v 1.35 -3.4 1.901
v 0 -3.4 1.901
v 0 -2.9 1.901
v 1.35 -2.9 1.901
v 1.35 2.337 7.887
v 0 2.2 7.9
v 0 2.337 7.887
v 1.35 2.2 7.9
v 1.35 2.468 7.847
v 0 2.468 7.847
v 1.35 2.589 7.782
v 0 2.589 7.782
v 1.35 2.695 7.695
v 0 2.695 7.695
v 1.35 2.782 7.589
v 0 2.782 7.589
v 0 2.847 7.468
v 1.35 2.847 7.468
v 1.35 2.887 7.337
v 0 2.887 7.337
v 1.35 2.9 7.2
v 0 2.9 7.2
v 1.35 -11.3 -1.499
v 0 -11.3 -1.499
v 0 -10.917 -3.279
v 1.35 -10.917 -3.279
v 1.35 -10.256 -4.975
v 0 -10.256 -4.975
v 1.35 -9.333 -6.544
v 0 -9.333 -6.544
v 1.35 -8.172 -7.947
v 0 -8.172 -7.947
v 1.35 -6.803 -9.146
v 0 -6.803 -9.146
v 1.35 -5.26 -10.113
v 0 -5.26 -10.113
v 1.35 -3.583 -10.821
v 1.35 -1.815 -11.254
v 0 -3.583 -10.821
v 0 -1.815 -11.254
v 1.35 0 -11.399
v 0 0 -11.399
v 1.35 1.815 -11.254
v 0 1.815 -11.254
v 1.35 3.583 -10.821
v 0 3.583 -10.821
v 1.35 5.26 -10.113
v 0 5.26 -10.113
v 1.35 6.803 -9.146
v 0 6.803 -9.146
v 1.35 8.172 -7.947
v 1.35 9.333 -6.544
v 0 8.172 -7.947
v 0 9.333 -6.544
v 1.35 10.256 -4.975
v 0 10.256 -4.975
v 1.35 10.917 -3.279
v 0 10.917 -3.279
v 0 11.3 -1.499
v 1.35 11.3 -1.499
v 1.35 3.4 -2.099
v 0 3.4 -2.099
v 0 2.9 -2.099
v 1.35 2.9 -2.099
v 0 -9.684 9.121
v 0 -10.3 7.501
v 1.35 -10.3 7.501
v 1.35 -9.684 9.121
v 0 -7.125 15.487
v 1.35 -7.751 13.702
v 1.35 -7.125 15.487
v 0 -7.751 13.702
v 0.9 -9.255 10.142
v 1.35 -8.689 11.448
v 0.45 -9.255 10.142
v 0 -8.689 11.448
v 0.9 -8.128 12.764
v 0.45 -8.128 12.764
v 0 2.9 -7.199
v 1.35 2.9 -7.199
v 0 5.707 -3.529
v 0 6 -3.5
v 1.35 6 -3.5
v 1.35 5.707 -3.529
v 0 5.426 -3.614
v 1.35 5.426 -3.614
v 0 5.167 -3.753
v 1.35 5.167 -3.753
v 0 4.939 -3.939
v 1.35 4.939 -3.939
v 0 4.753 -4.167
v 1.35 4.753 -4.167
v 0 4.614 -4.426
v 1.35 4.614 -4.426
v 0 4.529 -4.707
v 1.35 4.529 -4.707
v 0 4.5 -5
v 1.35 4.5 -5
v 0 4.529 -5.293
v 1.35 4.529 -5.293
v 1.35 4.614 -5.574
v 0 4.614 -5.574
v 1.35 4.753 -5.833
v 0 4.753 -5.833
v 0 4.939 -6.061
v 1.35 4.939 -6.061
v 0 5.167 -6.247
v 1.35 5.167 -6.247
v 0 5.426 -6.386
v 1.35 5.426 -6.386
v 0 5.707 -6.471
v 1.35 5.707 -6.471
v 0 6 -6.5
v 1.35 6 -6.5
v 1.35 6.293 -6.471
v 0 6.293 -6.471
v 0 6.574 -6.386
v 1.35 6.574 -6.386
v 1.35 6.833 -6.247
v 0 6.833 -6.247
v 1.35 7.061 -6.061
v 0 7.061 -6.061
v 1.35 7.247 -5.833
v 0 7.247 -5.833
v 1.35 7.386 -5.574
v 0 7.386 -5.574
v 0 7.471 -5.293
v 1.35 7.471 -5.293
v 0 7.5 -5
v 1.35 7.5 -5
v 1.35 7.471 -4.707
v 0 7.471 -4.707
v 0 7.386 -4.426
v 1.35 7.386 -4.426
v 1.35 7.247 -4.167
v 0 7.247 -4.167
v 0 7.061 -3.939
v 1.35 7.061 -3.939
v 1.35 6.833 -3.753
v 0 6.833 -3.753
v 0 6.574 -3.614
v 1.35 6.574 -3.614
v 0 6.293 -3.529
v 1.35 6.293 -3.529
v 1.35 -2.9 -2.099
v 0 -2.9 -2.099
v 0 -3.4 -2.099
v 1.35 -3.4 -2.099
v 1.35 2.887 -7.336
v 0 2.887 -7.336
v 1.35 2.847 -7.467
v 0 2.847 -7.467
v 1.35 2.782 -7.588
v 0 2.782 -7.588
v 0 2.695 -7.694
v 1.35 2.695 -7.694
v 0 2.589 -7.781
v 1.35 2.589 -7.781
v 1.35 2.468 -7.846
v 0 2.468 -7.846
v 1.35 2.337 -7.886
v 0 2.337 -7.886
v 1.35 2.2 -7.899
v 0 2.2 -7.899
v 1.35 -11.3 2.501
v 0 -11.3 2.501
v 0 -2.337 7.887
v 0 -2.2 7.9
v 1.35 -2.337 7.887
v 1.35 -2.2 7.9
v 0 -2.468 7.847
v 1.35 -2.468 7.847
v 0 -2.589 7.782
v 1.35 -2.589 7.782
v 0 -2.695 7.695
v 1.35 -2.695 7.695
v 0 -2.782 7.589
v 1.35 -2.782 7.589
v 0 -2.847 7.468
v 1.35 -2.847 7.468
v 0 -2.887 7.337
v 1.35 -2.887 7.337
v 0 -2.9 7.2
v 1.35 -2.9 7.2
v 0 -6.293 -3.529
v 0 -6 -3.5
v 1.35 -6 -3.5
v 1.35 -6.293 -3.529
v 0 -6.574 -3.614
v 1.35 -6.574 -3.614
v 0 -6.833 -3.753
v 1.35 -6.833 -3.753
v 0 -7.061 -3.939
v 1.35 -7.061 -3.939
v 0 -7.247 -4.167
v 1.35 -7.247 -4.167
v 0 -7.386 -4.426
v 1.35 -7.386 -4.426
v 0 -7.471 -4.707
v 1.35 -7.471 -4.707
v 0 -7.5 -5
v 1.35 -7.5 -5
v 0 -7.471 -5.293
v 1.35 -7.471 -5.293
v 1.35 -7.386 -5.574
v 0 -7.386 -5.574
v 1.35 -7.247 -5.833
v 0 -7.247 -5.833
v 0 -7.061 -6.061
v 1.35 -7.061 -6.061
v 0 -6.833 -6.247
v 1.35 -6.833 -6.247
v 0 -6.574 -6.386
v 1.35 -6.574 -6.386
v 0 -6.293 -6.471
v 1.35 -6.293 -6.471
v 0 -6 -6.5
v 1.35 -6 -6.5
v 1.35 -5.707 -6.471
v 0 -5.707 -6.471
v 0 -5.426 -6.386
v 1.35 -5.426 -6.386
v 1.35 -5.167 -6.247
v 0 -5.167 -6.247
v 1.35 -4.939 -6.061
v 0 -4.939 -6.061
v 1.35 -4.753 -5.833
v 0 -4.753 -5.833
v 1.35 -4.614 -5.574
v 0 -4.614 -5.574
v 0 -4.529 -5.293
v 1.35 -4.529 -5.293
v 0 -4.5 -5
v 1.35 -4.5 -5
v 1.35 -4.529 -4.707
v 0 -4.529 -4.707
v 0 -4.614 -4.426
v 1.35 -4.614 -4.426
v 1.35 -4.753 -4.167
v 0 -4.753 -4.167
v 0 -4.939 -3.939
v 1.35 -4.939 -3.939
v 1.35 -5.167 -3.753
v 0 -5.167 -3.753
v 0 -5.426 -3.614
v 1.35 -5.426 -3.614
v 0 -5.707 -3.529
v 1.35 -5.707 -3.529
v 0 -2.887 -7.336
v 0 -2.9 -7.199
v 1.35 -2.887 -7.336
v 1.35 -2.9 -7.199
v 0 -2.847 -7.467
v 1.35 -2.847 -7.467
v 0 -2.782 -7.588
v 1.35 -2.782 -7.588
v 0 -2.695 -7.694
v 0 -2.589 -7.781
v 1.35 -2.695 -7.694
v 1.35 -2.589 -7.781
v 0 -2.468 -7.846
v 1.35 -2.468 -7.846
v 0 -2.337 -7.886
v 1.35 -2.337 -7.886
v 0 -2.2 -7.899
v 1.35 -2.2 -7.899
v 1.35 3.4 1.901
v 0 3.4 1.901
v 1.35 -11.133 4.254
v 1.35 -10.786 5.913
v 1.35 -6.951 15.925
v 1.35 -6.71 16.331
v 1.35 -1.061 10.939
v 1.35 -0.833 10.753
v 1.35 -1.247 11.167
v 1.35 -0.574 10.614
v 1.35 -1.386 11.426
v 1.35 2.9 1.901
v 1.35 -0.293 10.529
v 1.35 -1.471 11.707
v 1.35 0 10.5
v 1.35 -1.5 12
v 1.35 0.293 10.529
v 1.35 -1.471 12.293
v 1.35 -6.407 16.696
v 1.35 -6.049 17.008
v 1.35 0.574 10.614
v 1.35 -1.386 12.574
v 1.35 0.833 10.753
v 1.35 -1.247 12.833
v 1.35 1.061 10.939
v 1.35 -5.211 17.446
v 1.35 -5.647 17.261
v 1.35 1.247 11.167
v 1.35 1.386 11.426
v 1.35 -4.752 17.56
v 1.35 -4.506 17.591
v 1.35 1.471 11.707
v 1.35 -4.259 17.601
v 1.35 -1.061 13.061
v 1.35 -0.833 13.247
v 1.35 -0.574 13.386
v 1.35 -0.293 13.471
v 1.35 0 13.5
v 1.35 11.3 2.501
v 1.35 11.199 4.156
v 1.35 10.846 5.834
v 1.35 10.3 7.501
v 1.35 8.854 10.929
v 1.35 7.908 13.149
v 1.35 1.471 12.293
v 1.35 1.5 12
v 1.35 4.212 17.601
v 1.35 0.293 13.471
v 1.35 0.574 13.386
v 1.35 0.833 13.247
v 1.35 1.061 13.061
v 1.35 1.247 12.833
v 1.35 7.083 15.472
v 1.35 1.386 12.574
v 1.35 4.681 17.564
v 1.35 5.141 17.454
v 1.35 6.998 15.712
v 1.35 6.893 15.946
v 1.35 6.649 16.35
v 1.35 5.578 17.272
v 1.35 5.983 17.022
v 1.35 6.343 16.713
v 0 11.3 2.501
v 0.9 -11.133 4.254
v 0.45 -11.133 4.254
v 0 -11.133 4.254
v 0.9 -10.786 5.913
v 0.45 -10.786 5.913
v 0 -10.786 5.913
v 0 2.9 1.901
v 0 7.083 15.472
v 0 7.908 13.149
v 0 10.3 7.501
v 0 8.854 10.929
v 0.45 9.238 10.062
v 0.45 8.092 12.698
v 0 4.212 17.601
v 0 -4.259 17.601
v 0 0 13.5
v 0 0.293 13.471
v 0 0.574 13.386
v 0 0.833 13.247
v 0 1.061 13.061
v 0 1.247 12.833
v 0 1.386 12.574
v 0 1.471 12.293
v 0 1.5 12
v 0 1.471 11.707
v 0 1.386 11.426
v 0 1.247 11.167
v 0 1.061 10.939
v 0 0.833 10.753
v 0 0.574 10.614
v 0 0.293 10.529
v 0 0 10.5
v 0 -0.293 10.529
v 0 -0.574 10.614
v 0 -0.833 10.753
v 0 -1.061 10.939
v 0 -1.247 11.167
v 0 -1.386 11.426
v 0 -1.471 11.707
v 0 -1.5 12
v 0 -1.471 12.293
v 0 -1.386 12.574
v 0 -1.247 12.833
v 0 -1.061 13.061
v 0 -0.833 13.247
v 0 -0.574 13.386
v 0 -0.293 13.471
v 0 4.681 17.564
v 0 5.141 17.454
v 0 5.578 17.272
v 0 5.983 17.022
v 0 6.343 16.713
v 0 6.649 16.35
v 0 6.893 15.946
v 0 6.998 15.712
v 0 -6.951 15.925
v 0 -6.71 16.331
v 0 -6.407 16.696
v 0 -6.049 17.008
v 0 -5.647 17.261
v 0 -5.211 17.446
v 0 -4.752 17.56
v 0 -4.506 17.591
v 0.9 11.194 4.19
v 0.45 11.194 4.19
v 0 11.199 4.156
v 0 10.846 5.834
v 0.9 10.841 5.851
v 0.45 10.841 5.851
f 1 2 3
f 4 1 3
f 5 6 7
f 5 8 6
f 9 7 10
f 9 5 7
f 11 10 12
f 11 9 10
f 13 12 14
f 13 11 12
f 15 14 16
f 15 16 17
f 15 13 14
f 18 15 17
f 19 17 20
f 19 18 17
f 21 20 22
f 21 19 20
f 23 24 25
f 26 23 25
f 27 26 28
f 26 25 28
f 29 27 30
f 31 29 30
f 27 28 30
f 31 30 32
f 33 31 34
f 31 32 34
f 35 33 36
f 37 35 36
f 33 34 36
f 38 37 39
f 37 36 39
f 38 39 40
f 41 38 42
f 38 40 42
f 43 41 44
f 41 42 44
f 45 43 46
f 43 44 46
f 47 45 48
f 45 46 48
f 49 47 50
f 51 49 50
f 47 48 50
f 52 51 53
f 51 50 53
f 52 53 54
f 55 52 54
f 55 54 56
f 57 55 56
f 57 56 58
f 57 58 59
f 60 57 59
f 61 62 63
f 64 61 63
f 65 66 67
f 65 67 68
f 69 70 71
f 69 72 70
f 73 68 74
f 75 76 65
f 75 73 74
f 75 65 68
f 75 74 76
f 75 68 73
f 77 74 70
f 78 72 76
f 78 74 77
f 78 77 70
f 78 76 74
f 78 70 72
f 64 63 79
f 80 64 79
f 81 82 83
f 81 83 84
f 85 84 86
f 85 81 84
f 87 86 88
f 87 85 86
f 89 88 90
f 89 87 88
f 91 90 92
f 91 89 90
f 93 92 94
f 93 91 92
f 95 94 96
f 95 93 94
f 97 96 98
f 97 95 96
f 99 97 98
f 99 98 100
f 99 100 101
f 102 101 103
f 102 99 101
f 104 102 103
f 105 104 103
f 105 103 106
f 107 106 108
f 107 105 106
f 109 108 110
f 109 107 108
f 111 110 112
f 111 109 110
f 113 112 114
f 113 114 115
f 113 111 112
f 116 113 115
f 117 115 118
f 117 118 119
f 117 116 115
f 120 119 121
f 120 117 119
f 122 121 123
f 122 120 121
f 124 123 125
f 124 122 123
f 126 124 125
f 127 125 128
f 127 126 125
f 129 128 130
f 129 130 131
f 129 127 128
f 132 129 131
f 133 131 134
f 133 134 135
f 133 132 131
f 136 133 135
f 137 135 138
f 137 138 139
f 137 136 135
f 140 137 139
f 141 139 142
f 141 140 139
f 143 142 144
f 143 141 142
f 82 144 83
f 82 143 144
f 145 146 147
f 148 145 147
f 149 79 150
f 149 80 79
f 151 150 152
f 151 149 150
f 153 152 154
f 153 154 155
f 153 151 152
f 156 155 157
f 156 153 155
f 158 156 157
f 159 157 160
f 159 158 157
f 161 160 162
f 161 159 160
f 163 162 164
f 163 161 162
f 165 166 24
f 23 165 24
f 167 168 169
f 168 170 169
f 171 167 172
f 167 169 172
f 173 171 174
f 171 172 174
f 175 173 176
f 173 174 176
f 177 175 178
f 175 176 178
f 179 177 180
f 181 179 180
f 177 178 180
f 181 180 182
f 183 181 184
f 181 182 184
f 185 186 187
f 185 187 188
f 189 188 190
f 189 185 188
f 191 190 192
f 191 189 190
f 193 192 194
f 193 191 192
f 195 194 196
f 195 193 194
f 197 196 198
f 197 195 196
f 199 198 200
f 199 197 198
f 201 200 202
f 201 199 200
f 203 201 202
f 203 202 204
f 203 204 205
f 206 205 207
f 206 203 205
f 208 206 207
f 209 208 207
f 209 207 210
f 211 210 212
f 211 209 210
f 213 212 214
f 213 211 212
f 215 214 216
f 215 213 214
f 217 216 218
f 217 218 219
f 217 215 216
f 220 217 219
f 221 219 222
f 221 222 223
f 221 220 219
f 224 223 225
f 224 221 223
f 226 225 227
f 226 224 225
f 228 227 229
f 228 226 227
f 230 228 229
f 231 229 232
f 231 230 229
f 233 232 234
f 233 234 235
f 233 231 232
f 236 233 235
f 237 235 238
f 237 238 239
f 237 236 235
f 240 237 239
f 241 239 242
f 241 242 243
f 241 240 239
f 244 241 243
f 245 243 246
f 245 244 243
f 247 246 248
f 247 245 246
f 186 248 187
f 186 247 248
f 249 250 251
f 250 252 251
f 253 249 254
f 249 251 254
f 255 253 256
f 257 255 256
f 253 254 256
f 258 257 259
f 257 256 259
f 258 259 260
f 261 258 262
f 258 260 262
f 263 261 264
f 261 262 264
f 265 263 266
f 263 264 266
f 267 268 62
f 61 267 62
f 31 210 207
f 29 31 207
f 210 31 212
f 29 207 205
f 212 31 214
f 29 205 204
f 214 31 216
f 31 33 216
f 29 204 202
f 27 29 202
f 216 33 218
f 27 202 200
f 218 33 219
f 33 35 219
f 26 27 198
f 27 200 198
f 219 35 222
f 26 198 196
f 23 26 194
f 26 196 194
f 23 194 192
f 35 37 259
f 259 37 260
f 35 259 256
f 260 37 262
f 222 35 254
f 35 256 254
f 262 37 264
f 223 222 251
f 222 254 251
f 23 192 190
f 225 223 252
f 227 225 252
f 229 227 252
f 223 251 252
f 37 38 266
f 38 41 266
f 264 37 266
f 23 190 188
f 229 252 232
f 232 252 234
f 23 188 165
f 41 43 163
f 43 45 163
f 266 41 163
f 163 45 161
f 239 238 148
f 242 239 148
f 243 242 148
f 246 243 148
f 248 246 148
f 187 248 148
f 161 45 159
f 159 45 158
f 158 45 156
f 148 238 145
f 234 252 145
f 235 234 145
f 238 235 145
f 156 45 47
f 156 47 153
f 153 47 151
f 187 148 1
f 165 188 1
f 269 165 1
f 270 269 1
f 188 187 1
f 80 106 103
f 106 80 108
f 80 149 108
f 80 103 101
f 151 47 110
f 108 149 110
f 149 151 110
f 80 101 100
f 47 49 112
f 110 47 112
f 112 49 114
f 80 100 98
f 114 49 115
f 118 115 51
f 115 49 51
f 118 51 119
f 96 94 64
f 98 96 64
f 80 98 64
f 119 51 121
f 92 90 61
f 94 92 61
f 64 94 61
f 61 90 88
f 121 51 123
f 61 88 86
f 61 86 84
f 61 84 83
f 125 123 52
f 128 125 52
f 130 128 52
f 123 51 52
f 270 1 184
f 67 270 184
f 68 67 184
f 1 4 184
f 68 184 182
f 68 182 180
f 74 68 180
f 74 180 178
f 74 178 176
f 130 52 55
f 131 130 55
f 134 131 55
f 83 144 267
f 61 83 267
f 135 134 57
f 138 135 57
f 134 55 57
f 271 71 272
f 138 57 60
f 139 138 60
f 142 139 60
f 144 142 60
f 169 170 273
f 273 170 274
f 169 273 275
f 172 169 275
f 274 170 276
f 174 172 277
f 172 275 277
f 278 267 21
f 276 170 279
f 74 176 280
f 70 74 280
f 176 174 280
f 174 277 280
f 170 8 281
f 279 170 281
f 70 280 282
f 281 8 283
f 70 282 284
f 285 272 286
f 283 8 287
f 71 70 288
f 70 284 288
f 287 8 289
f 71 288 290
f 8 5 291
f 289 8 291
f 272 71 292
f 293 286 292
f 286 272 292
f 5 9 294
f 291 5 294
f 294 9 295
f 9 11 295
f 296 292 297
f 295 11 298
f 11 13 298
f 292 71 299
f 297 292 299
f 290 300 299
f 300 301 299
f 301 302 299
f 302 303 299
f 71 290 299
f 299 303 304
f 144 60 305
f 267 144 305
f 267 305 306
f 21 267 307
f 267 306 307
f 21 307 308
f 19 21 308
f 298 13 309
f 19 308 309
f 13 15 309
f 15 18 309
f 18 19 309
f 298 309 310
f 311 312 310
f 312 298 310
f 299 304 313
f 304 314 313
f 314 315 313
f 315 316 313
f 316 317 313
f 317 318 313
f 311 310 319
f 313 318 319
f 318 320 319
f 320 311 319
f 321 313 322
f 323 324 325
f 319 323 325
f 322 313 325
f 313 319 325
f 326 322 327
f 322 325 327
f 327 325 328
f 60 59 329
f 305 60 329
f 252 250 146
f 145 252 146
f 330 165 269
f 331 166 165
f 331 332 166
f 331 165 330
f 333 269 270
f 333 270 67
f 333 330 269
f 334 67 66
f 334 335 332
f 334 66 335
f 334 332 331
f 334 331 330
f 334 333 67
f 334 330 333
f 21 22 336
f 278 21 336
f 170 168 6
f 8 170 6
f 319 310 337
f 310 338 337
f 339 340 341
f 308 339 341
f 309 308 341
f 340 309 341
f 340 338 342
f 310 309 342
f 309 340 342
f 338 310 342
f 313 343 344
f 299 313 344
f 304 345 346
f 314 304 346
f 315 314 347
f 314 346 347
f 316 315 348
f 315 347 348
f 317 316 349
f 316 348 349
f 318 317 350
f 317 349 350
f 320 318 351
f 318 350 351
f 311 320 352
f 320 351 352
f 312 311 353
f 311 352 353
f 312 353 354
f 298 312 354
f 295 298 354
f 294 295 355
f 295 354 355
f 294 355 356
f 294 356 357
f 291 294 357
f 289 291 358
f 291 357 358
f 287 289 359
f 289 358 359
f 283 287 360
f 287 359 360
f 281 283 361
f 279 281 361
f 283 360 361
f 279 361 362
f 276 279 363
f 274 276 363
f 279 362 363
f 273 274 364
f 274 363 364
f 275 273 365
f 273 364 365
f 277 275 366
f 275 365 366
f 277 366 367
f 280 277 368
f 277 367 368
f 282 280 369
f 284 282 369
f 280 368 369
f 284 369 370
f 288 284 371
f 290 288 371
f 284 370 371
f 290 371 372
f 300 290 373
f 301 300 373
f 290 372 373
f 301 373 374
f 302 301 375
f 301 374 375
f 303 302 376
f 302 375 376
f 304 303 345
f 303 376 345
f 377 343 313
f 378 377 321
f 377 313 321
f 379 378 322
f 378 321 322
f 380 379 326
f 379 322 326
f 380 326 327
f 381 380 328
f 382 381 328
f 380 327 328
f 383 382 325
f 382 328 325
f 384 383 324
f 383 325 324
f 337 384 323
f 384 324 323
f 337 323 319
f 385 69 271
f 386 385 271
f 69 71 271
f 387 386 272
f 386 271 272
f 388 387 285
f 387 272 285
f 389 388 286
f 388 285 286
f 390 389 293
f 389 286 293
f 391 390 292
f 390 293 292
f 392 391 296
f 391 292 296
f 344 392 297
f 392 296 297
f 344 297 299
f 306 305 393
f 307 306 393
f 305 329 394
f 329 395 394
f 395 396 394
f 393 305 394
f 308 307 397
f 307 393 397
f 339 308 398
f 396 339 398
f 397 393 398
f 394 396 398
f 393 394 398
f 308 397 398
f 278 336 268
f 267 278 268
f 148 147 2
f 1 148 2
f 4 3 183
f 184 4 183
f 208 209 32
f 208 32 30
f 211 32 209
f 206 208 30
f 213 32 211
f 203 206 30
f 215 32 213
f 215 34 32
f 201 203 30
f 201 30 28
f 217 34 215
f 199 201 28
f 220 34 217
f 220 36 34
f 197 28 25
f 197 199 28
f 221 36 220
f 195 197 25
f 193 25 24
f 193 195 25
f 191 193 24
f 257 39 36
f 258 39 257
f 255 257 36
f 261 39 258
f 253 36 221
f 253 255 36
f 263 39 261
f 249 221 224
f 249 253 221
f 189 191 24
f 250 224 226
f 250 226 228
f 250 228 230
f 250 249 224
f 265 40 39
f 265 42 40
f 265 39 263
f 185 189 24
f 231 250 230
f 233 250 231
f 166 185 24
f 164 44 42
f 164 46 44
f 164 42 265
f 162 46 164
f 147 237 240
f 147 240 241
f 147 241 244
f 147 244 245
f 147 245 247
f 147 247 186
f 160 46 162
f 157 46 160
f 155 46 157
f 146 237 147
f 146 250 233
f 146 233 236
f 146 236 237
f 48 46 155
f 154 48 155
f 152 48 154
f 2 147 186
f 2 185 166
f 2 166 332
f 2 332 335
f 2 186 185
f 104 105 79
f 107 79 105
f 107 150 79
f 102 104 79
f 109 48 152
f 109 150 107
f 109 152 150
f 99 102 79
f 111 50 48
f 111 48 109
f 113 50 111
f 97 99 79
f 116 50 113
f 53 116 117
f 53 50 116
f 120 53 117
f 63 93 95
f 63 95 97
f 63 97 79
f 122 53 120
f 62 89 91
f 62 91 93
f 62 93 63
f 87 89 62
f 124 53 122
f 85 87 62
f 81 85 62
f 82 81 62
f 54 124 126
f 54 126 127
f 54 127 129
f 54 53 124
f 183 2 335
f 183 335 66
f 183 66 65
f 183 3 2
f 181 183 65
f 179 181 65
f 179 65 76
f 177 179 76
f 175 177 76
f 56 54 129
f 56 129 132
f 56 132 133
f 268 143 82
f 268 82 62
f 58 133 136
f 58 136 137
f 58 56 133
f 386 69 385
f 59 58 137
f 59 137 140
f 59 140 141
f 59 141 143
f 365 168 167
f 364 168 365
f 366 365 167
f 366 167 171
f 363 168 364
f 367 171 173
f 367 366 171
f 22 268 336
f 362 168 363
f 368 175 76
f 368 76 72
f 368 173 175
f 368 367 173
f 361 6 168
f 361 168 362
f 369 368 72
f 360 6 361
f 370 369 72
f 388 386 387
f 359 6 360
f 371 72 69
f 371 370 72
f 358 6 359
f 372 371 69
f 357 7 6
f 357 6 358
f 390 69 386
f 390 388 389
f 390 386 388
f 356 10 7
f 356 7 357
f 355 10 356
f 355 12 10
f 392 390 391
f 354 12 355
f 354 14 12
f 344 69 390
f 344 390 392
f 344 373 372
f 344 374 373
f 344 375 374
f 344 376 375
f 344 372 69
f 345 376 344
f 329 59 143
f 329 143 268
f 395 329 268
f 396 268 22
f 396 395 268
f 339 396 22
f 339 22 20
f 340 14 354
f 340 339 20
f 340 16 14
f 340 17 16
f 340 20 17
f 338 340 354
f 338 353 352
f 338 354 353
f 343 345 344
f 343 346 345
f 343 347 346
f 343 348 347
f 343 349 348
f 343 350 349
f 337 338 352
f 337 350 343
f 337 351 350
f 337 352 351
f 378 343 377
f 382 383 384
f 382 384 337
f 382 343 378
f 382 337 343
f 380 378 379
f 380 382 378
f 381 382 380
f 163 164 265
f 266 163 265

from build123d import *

# Parameters (mm, degrees)
SCHIZZO1_R                   = 1.5
ESTRUSIONE_ESTRUSIONE1_DEPTH = 1.35
RACCORDO2_R                  = 3
RACCORDO3_R                  = 3
RACCORDO4_R                  = 0.7


with BuildPart() as part:
    # Schizzo1 → Estrusione-Estrusione1 (new body)
    with BuildSketch(Plane(origin=(0, 0, 0), x_dir=(0, 0, -1), z_dir=(1, 0, 0))):
        with BuildLine():
            add(Edge.make_bspline(
                [(-7.501010101, -10.3), (-10.845030199, -9.13986581), (-13.865102381, -7.304364218), (-17.601010101, -6.594005849)],
                knots=[0.271280726, 0.271280726, 0.271280726, 0.271280726, 0.852483684, 0.852483684, 0.852483684, 0.852483684], degree=3))
            add(Edge.make_bspline(
                [(-2.501010101, -11.3), (-4.308742426, -11.235865063), (-5.940164296, -10.841501107), (-7.501010101, -10.3)],
                knots=[0, 0, 0, 0, 0.271280726, 0.271280726, 0.271280726, 0.271280726], degree=3))
            Line((-2.501010101, -11.3), (1.498989899, -11.3))
            ThreePointArc((1.498989899, -11.3), (11.398989899, 0), (1.498989899, 11.3))
            Line((1.498989899, 11.3), (-2.501010101, 11.3))
            add(Edge.make_bspline(
                [(-2.501010101, 11.3), (-4.209338931, 11.338090952), (-5.850739142, 10.914740779), (-7.501010101, 10.3)],
                knots=[0, 0, 0, 0, 0.293888871, 0.293888871, 0.293888871, 0.293888871], degree=3))
            add(Edge.make_bspline(
                [(-7.501010101, 10.3), (-10.658273676, 9.123890914), (-13.848006436, 7.247243694), (-17.601010101, 6.561146452)],
                knots=[0.293888871, 0.293888871, 0.293888871, 0.293888871, 0.856150858, 0.856150858, 0.856150858, 0.856150858], degree=3))
            Line((-17.601010101, 6.561146452), (-17.601010101, 0))
            Line((-17.601010101, 0), (-17.601010101, -6.594005849))
        make_face()
        with Locations(Location((5, -6, 0), (0, 0, 180))):
            Circle(SCHIZZO1_R, mode=Mode.SUBTRACT)
        with BuildLine():
            ThreePointArc((-10.5, 0), (-12, -1.5), (-13.5, 0))
            ThreePointArc((-13.5, 0), (-12, 1.5), (-10.5, 0))
        make_face(mode=Mode.SUBTRACT)
        Polygon((-7.9, -2.9), (-7.9, 0), (-7.9, 2.9), (-1.901010101, 2.9), (-1.901010101, 3.4), (2.098989899, 3.4), (2.098989899, 2.9), (7.898989899, 2.9), (7.898989899, -2.9), (2.098989899, -2.9), (2.098989899, -3.4), (-1.901010101, -3.4), (-1.901010101, -2.9), align=None, mode=Mode.SUBTRACT)
        with Locations(Location((5, 6, 0), (0, 0, 180))):
            Circle(SCHIZZO1_R, mode=Mode.SUBTRACT)
    extrude(amount=ESTRUSIONE_ESTRUSIONE1_DEPTH)

    # Raccordo2
    raccordo2_edges = [part.edges().sort_by_distance(p)[0] for p in [
        (0.675, -6.594005849, 17.601010101),
    ]]
    fillet(raccordo2_edges, radius=RACCORDO2_R)

    # Raccordo3
    raccordo3_edges = [part.edges().sort_by_distance(p)[0] for p in [
        (0.675, 6.561146452, 17.601010101),
    ]]
    fillet(raccordo3_edges, radius=RACCORDO3_R)

    # Raccordo4
    raccordo4_edges = [part.edges().sort_by_distance(p)[0] for p in [
        (0.675, -2.9, -7.898989899),
        (0.675, 2.9, -7.898989899),
        (0.675, 2.9, 7.9),
        (0.675, -2.9, 7.9),
    ]]
    fillet(raccordo4_edges, radius=RACCORDO4_R)


solid = part.part
